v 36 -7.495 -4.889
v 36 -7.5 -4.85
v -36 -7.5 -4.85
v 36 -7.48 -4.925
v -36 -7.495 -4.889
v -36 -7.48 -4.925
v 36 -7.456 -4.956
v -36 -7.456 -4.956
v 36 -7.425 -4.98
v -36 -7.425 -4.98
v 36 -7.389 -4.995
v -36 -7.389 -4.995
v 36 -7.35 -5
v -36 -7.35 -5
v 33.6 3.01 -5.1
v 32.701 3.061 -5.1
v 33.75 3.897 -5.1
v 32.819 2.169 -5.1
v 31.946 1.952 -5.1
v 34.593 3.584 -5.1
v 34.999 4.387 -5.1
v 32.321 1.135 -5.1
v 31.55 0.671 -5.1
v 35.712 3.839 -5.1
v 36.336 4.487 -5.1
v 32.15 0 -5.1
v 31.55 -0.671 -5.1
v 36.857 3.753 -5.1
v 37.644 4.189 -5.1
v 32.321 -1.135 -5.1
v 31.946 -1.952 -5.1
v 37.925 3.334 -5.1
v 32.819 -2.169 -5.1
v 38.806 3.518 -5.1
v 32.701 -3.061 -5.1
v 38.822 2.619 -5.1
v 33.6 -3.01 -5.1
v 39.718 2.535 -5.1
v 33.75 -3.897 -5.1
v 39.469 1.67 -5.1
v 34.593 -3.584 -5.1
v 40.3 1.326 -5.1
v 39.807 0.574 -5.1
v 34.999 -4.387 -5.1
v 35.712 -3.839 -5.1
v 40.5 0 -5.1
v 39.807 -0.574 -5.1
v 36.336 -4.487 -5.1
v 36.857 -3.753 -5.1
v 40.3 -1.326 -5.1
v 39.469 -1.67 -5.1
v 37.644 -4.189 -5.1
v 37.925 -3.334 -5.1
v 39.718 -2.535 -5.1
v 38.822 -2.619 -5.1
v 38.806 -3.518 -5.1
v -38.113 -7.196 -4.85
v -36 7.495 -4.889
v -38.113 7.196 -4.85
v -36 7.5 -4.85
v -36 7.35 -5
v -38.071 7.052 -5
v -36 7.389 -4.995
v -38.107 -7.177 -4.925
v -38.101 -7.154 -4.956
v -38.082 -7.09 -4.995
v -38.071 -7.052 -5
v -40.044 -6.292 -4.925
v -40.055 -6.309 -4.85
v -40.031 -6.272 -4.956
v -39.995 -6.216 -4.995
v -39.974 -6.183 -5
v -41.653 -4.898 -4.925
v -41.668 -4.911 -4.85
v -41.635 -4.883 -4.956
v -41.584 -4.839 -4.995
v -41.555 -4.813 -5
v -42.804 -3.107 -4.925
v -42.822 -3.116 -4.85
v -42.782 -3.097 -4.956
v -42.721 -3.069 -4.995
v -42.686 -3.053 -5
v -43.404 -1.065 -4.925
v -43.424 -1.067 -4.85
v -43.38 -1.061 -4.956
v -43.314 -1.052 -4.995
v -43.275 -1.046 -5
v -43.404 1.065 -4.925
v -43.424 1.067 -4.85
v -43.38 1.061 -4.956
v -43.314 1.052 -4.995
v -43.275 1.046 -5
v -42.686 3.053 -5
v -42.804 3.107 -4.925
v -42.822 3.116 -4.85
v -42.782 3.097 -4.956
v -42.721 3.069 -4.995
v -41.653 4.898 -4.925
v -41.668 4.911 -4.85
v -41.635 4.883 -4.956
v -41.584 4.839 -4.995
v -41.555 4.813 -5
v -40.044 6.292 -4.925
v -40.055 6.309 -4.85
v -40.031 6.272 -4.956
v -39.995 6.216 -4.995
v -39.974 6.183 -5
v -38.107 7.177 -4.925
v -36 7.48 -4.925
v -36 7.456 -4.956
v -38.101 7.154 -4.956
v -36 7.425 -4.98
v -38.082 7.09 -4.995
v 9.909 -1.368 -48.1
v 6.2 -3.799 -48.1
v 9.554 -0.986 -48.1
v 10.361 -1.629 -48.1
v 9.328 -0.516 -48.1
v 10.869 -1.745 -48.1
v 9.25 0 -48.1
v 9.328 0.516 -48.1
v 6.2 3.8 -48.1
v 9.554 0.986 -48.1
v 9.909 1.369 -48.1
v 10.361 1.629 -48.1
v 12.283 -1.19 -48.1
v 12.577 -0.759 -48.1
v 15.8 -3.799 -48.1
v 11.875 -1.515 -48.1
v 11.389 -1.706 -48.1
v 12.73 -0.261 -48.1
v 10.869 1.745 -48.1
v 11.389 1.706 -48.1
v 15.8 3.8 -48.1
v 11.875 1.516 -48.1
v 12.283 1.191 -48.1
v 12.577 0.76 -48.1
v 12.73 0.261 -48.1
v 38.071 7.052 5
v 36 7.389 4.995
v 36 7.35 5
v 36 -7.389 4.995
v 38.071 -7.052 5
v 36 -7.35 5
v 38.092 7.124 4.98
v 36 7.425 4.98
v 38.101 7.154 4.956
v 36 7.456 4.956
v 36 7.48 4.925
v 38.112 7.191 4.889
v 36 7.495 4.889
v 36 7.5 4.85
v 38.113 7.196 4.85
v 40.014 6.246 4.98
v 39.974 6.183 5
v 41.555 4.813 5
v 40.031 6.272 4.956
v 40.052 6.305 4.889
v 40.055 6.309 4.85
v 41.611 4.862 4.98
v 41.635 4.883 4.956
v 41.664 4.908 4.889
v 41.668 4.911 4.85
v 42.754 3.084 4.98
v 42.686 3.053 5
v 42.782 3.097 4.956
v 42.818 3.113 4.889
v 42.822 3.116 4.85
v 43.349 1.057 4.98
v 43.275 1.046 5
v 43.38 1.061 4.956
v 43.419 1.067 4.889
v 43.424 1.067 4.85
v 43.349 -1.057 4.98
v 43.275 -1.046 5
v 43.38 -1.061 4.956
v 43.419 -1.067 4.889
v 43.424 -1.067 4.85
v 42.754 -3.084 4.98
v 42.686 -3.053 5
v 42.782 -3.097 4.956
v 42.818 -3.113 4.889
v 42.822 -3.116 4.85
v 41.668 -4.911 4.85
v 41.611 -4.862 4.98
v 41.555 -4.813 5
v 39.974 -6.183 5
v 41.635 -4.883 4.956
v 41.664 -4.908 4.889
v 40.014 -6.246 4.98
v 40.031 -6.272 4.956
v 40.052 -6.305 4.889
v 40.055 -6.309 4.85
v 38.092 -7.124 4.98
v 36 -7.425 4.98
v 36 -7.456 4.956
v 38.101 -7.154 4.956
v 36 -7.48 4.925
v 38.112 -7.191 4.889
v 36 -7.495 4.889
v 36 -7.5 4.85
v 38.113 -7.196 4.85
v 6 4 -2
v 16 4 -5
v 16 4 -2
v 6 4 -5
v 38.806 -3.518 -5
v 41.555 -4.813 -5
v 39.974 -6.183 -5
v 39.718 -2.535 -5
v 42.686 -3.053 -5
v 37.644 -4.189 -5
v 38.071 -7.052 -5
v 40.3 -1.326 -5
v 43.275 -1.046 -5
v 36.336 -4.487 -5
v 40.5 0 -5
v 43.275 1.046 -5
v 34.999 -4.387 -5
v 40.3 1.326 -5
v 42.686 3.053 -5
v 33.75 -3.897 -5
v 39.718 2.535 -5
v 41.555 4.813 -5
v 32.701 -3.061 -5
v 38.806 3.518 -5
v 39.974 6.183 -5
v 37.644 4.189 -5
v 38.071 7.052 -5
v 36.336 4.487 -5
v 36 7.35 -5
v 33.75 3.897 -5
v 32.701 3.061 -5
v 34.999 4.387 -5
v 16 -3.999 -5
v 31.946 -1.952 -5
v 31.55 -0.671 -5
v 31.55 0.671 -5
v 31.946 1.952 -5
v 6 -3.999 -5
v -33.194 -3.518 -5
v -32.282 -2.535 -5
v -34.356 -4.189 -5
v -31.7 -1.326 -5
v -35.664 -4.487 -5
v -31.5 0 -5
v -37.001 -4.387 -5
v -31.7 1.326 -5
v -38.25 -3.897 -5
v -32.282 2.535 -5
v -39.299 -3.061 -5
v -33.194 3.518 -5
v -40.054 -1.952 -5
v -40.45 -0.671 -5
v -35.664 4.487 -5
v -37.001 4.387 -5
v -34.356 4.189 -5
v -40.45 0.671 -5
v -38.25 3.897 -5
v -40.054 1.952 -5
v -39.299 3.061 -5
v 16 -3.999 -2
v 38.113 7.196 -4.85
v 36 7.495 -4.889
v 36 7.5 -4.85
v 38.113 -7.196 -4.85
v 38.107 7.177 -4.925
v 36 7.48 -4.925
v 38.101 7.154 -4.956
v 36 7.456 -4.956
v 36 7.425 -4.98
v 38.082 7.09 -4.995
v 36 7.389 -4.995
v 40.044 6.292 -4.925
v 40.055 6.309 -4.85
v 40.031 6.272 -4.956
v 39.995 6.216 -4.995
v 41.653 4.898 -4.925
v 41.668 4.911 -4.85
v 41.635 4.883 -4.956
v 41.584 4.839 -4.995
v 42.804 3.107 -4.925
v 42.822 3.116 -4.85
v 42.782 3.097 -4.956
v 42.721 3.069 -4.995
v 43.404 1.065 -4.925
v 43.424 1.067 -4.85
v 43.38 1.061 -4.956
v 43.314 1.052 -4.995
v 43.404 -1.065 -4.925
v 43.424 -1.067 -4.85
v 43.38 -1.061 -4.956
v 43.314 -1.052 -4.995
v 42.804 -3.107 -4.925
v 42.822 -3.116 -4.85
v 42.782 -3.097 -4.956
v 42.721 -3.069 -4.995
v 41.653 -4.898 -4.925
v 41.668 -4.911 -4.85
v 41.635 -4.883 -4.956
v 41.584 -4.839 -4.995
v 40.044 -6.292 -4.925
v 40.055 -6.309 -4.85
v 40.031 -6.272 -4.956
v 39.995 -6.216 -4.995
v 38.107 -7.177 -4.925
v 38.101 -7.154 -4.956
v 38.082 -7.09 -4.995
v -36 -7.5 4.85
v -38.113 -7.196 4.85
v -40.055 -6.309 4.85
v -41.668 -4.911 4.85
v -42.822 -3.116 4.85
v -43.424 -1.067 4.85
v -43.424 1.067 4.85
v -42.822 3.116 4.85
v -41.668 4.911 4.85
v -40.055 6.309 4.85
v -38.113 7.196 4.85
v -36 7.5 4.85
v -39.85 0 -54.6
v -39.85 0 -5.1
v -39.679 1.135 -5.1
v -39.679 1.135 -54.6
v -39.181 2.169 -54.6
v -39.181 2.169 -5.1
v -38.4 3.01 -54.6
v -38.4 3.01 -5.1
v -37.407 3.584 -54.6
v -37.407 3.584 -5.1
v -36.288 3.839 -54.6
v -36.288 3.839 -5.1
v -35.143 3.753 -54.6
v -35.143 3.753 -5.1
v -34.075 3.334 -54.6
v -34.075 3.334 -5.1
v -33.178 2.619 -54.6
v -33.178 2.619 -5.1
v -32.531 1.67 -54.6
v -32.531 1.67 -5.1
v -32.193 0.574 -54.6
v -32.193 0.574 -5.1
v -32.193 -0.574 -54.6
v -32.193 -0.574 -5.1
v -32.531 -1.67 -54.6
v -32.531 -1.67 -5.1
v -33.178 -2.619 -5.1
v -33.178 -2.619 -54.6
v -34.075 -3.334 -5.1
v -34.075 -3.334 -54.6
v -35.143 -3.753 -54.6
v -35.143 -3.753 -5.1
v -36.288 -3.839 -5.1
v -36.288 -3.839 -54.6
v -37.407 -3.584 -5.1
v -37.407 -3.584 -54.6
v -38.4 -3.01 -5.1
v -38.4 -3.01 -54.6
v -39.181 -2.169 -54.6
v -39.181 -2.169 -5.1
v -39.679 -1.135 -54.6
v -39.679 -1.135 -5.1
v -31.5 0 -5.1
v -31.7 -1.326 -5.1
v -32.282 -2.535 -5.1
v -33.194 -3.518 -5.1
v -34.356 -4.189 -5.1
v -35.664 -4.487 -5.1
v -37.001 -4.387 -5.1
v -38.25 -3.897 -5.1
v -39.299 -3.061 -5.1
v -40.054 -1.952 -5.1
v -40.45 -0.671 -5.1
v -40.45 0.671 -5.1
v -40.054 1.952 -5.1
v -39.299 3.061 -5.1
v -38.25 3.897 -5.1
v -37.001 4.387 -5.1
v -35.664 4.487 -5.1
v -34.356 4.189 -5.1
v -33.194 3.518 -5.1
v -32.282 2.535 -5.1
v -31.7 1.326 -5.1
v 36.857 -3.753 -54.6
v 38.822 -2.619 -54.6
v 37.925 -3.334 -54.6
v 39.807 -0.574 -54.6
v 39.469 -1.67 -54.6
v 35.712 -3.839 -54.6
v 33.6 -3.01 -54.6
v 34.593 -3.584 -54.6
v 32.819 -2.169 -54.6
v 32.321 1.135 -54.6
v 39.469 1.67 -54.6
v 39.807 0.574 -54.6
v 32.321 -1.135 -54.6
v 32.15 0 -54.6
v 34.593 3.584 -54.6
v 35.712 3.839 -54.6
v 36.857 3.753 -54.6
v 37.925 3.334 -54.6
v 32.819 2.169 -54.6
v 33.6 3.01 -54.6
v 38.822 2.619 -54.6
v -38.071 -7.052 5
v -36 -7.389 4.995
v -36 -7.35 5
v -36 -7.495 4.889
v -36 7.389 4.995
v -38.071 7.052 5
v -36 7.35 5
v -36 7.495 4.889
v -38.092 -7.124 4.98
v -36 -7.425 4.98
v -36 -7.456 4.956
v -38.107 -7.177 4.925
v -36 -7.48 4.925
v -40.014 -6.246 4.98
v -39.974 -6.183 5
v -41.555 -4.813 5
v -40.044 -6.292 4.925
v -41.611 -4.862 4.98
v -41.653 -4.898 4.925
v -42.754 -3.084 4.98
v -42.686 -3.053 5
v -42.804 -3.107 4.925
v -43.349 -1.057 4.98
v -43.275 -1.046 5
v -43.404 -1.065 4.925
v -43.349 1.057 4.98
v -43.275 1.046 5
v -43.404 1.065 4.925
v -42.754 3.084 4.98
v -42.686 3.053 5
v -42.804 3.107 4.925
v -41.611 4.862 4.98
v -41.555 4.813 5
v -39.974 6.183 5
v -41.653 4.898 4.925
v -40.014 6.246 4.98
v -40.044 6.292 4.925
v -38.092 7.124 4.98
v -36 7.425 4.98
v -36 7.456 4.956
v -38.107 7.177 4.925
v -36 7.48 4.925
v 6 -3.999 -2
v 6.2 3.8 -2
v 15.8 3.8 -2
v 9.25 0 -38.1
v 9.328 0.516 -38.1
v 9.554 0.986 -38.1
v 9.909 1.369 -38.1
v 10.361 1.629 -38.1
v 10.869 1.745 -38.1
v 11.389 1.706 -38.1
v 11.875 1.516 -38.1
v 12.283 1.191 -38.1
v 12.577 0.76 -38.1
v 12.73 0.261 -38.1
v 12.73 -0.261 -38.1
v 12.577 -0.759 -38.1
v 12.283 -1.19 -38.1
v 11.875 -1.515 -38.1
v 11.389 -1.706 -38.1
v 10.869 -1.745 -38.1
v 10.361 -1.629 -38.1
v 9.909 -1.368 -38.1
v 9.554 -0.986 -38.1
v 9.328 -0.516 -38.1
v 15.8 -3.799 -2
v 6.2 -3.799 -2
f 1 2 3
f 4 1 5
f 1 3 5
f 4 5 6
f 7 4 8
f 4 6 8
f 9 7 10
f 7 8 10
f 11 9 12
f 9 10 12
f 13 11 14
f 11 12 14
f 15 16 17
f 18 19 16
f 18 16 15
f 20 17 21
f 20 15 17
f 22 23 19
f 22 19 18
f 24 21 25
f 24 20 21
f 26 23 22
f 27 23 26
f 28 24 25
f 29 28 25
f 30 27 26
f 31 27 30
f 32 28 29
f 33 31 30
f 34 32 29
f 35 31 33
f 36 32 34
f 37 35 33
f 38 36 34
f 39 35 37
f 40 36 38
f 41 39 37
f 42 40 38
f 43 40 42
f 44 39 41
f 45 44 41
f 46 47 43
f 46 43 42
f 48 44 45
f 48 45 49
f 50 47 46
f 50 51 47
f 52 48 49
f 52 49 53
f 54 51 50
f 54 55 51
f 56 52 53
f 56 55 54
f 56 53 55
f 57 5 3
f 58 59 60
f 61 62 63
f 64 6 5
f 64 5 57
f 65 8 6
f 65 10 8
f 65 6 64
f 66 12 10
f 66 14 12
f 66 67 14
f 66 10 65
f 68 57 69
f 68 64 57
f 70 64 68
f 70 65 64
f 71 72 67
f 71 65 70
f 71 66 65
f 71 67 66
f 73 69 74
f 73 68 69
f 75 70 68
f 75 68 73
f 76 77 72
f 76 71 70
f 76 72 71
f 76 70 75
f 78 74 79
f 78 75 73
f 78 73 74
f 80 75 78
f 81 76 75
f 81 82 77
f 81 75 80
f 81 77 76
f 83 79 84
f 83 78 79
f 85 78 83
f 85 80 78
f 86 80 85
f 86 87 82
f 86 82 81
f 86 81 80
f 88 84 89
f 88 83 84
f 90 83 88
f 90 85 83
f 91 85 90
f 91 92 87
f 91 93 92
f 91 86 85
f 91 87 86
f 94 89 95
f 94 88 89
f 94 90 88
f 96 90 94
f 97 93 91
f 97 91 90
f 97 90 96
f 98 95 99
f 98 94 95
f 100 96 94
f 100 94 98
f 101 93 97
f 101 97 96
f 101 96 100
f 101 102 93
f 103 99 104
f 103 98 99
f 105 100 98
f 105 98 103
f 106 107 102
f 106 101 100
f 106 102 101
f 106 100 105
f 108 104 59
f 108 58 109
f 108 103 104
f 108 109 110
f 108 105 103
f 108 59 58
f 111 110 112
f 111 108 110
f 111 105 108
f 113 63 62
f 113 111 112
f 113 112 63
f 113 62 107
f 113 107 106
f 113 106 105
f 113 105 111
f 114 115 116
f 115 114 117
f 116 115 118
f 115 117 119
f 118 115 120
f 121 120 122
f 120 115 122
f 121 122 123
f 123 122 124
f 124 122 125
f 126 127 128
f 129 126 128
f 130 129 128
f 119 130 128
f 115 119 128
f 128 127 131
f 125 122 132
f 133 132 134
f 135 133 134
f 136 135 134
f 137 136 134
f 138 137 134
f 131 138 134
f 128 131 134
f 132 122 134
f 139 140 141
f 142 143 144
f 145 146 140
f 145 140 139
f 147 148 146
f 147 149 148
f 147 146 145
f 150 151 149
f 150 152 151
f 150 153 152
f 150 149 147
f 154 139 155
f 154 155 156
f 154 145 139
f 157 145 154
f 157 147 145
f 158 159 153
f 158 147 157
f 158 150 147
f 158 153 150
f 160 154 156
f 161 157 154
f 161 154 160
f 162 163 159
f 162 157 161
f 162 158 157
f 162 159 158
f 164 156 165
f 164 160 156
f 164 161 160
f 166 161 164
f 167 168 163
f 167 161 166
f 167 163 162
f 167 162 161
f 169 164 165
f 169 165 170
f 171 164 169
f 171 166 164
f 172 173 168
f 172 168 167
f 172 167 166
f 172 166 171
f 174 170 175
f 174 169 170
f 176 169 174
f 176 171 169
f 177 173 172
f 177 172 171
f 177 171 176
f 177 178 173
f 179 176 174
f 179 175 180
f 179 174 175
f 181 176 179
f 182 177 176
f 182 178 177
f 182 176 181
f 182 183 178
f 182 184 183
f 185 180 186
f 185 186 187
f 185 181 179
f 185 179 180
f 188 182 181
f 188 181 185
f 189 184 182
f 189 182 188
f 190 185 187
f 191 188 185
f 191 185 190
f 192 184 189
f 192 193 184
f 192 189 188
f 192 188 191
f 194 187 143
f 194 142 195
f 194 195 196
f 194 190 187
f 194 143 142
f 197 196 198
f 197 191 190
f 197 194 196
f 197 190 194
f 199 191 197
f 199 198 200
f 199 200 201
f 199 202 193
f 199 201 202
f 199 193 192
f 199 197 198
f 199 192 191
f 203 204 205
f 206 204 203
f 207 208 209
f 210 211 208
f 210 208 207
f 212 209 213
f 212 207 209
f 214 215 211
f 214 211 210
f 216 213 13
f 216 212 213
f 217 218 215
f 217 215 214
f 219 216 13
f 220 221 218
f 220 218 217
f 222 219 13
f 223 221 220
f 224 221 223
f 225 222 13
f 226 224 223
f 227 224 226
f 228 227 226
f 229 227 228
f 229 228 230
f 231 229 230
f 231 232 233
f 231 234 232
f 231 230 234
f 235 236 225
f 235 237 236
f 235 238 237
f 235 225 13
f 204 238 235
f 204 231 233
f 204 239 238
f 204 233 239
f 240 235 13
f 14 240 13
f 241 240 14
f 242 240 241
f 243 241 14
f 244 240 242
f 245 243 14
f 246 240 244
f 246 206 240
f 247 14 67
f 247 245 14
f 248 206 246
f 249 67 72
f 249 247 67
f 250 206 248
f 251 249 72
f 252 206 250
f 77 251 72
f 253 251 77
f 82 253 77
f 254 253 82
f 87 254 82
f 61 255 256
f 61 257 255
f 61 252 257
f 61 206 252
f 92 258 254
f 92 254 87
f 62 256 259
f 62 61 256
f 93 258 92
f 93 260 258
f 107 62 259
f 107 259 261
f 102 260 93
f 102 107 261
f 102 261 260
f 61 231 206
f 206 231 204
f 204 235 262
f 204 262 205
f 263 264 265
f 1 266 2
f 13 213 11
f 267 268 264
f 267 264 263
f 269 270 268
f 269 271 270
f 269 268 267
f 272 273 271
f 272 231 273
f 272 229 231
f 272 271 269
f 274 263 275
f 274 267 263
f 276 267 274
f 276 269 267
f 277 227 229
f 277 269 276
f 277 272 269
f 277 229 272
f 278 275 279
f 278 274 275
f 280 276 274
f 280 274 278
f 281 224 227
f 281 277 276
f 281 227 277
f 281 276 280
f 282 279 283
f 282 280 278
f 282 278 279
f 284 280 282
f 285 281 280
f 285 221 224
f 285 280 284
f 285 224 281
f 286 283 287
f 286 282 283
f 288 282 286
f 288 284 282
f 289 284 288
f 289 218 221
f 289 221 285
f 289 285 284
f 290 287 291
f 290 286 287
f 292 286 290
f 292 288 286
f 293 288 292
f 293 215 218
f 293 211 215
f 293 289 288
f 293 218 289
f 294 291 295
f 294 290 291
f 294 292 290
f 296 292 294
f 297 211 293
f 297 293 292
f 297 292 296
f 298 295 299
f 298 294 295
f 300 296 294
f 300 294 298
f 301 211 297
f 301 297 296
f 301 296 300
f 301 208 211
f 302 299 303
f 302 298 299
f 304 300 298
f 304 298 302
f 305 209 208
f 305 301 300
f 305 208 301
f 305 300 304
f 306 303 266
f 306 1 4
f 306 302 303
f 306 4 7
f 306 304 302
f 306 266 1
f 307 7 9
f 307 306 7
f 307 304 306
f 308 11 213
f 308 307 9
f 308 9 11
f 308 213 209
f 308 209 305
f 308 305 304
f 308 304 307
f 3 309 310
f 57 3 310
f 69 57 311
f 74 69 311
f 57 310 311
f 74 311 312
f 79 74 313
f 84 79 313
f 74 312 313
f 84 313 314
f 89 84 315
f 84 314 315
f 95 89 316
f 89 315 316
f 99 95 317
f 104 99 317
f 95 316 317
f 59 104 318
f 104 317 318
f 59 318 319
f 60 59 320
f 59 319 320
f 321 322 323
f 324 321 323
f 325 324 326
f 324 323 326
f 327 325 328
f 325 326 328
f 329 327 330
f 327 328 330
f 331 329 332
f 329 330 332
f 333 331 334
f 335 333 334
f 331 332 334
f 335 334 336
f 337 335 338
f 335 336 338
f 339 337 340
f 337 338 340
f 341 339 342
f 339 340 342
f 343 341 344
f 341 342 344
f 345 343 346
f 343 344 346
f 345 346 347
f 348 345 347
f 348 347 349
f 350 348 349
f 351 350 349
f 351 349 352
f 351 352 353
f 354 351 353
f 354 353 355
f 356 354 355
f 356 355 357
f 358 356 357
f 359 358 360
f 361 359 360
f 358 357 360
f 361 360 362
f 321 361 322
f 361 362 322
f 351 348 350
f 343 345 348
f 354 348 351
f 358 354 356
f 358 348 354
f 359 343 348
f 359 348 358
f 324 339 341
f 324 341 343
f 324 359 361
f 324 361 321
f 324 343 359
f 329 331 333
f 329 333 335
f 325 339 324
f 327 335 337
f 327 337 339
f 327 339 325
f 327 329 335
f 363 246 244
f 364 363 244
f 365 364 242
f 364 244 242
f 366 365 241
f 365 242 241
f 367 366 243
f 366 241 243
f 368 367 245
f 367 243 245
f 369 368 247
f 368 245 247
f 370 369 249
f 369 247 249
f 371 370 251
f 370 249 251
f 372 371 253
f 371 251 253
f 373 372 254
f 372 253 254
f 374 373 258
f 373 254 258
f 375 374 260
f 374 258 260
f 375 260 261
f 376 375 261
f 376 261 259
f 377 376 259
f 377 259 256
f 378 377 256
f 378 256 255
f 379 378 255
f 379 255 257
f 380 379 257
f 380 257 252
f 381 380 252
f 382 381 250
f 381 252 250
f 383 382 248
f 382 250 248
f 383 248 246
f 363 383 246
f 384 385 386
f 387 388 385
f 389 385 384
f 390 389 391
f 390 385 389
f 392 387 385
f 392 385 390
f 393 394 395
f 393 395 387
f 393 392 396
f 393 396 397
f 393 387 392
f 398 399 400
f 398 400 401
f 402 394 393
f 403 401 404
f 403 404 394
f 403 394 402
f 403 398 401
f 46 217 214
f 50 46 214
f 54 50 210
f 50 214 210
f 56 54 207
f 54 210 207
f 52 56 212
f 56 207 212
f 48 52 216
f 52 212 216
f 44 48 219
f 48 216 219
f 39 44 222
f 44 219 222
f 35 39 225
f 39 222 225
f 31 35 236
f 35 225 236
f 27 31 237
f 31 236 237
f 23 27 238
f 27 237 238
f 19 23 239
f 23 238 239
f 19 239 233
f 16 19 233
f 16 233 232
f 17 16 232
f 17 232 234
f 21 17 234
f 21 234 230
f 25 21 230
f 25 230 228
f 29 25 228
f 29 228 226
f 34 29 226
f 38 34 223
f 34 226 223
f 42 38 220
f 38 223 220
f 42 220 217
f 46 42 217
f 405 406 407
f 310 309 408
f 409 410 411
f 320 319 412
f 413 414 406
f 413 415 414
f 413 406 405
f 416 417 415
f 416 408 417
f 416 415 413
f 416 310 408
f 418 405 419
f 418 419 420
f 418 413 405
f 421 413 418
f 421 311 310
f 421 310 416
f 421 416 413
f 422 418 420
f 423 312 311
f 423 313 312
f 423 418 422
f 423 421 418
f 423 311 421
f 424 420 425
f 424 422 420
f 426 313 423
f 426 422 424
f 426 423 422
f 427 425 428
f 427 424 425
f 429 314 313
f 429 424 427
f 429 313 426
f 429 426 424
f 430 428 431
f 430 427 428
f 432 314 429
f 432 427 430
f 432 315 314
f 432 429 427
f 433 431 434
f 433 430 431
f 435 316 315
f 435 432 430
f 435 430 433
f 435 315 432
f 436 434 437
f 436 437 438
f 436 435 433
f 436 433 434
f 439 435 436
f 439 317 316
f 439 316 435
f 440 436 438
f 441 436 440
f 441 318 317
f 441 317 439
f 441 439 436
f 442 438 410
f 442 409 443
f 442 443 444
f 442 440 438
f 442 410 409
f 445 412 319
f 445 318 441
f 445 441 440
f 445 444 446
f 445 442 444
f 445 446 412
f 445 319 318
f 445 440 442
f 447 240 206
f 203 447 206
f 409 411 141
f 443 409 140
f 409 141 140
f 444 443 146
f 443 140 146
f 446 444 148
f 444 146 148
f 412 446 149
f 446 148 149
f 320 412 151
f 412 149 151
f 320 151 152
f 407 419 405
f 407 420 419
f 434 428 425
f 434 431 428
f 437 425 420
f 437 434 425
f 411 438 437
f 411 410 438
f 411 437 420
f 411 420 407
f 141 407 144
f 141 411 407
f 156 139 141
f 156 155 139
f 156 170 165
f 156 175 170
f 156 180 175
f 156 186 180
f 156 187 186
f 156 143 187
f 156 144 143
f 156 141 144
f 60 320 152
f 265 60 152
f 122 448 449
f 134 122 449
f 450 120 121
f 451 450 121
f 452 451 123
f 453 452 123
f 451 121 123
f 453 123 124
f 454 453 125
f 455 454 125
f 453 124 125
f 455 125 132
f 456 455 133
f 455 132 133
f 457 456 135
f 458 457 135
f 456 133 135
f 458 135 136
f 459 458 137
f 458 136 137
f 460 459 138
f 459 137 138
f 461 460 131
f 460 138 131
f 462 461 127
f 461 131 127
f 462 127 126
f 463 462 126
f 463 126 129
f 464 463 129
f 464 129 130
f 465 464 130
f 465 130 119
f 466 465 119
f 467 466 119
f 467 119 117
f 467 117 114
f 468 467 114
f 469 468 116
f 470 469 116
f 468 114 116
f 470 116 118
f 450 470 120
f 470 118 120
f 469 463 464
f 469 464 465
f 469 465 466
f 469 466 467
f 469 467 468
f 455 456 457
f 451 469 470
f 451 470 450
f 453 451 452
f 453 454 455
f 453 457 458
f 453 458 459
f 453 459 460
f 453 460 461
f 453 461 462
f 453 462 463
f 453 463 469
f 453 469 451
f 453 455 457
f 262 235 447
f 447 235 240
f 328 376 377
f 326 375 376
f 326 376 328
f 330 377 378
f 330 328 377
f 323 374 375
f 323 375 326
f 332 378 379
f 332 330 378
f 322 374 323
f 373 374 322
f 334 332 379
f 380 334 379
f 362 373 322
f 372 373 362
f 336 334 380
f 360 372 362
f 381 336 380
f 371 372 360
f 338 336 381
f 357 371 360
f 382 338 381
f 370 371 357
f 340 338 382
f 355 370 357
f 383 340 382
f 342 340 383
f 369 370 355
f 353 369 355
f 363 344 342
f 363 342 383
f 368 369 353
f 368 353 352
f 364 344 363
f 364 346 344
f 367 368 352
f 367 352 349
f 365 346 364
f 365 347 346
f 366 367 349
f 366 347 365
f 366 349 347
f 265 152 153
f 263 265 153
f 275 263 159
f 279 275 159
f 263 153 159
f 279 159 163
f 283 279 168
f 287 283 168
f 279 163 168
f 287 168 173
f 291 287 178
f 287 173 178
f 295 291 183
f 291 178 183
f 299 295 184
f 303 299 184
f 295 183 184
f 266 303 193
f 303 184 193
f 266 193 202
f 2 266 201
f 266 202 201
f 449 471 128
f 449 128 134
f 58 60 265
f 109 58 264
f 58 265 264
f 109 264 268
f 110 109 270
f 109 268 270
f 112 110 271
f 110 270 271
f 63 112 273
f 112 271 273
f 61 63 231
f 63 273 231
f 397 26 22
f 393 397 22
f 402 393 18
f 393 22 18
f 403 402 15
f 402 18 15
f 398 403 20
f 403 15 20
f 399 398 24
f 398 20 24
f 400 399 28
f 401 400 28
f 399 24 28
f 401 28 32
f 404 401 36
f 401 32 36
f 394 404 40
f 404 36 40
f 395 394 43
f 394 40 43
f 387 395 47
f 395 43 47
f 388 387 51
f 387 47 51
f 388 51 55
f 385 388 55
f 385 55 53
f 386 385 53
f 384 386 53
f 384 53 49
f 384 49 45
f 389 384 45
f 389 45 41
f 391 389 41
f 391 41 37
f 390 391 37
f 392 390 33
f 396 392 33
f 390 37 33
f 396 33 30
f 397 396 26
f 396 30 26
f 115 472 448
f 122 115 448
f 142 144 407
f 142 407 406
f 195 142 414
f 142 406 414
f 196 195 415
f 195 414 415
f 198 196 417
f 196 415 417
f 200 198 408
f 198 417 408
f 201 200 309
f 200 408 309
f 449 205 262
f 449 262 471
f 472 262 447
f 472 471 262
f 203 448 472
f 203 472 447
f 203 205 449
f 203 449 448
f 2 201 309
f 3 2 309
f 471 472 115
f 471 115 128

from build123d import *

# Parameters (mm, degrees)
SKETCH1_R           = 4
BOSS_EXTRUDE1_DEPTH = 5
FILLET2_R           = 0.15
SKETCH2_W           = 10
SKETCH2_H           = 7.9994
CUT_EXTRUDE1_DEPTH  = 3
SKETCH3_R           = 1.75
CUT_EXTRUDE2_DEPTH  = 45.69339996
SKETCH4_R           = 4.15
BOSS_EXTRUDE2_DEPTH = 10
SKETCH5_R           = 4.5
BOSS_EXTRUDE3_DEPTH = 0.1
SKETCH6_R           = 3.85
BOSS_EXTRUDE4_DEPTH = 49.5
SKETCH9_W           = 9.6
SKETCH9_H           = 7.5994
BOSS_EXTRUDE5_DEPTH = 53.1
SKETCH10_R          = 1.75
CUT_EXTRUDE3_DEPTH  = 10


with BuildPart() as part:
    # Sketch1 → Boss-Extrude1 (new, symmetric)
    with BuildSketch(Plane.XY):
        with BuildLine():
            Line((-35.999998845, 7.5), (35.999998845, 7.5))
            ThreePointArc((35.999998845, 7.5), (43.5, 0), (35.999998845, -7.5))
            Line((35.999998845, -7.5), (-35.999998845, -7.5))
            ThreePointArc((-35.999998845, -7.5), (-43.5, 0), (-35.999998845, 7.5))
        make_face()
        with Locations((-36, 0)):
            Circle(SKETCH1_R, mode=Mode.SUBTRACT)
        with Locations((36, 0)):
            Circle(SKETCH1_R, mode=Mode.SUBTRACT)
    extrude(amount=BOSS_EXTRUDE1_DEPTH, both=True)

    # Fillet2
    fillet2_edges = [part.edges().sort_by_distance(p)[0] for p in [
        (-40, 0, -5),
        (-40, 0, 5),
        (-43.5, 0, 5),
        (32, 0, -5),
        (32, 0, 5),
        (0, -7.5, 5),
        (43.5, 0, 5),
        (0, -7.5, -5),
        (-43.5, 0, -5),
        (0, 7.5, -5),
        (43.5, 0, -5),
        (0, 7.5, 5),
    ]]
    fillet(fillet2_edges, radius=FILLET2_R)

    # Sketch2 → Cut-Extrude1 (cut)
    with BuildSketch(Plane(origin=(0, 0, -5), x_dir=(-1, 0, 0), z_dir=(0, 0, -1))):
        with Locations((-11, 0.0003)):
            Rectangle(SKETCH2_W, SKETCH2_H)
    extrude(amount=-CUT_EXTRUDE1_DEPTH, mode=Mode.SUBTRACT)

    # Sketch3 → Cut-Extrude2 (cut, through all)
    with BuildSketch(Plane(origin=(0, 0, -2), x_dir=(-1, 0, 0), z_dir=(0, 0, -1))):
        with Locations((-11, 0.0003)):
            Circle(SKETCH3_R)
    extrude(amount=-CUT_EXTRUDE2_DEPTH, mode=Mode.SUBTRACT)

    # Sketch4 → Boss-Extrude2 (add)
    with BuildSketch(Plane.XY.offset(5)):
        with Locations((36, 0)):
            Circle(SKETCH4_R)
        with Locations((-36, 0)):
            Circle(SKETCH4_R)
    extrude(amount=-BOSS_EXTRUDE2_DEPTH)

    # Sketch5 → Boss-Extrude3 (add)
    with BuildSketch(Plane(origin=(0, 0, -5), x_dir=(-1, 0, 0), z_dir=(0, 0, -1))):
        with Locations(Location((36, 0, 0), (0, 0, 180))):
            Circle(SKETCH5_R)
        with Locations(Location((-36, 0, 0), (0, 0, 180))):
            Circle(SKETCH5_R)
    extrude(amount=BOSS_EXTRUDE3_DEPTH)

    # Sketch6 → Boss-Extrude4 (add)
    with BuildSketch(Plane(origin=(0, 0, -5.1), x_dir=(-1, 0, 0), z_dir=(0, 0, -1))):
        with Locations((-36, 0)):
            Circle(SKETCH6_R)
        with Locations((36, 0)):
            Circle(SKETCH6_R)
    extrude(amount=BOSS_EXTRUDE4_DEPTH)

    # Sketch9 → Boss-Extrude5 (add)
    with BuildSketch(Plane.XY.offset(5)):
        with Locations((11, 0.0003)):
            Rectangle(SKETCH9_W, SKETCH9_H)
    extrude(amount=-BOSS_EXTRUDE5_DEPTH)

    # Sketch10 → Cut-Extrude3 (cut)
    with BuildSketch(Plane(origin=(0, 0, -48.1), x_dir=(-1, 0, 0), z_dir=(0, 0, -1))):
        with Locations((-11, 0.0003)):
            Circle(SKETCH10_R)
    extrude(amount=-CUT_EXTRUDE3_DEPTH, mode=Mode.SUBTRACT)


solid = part.part
